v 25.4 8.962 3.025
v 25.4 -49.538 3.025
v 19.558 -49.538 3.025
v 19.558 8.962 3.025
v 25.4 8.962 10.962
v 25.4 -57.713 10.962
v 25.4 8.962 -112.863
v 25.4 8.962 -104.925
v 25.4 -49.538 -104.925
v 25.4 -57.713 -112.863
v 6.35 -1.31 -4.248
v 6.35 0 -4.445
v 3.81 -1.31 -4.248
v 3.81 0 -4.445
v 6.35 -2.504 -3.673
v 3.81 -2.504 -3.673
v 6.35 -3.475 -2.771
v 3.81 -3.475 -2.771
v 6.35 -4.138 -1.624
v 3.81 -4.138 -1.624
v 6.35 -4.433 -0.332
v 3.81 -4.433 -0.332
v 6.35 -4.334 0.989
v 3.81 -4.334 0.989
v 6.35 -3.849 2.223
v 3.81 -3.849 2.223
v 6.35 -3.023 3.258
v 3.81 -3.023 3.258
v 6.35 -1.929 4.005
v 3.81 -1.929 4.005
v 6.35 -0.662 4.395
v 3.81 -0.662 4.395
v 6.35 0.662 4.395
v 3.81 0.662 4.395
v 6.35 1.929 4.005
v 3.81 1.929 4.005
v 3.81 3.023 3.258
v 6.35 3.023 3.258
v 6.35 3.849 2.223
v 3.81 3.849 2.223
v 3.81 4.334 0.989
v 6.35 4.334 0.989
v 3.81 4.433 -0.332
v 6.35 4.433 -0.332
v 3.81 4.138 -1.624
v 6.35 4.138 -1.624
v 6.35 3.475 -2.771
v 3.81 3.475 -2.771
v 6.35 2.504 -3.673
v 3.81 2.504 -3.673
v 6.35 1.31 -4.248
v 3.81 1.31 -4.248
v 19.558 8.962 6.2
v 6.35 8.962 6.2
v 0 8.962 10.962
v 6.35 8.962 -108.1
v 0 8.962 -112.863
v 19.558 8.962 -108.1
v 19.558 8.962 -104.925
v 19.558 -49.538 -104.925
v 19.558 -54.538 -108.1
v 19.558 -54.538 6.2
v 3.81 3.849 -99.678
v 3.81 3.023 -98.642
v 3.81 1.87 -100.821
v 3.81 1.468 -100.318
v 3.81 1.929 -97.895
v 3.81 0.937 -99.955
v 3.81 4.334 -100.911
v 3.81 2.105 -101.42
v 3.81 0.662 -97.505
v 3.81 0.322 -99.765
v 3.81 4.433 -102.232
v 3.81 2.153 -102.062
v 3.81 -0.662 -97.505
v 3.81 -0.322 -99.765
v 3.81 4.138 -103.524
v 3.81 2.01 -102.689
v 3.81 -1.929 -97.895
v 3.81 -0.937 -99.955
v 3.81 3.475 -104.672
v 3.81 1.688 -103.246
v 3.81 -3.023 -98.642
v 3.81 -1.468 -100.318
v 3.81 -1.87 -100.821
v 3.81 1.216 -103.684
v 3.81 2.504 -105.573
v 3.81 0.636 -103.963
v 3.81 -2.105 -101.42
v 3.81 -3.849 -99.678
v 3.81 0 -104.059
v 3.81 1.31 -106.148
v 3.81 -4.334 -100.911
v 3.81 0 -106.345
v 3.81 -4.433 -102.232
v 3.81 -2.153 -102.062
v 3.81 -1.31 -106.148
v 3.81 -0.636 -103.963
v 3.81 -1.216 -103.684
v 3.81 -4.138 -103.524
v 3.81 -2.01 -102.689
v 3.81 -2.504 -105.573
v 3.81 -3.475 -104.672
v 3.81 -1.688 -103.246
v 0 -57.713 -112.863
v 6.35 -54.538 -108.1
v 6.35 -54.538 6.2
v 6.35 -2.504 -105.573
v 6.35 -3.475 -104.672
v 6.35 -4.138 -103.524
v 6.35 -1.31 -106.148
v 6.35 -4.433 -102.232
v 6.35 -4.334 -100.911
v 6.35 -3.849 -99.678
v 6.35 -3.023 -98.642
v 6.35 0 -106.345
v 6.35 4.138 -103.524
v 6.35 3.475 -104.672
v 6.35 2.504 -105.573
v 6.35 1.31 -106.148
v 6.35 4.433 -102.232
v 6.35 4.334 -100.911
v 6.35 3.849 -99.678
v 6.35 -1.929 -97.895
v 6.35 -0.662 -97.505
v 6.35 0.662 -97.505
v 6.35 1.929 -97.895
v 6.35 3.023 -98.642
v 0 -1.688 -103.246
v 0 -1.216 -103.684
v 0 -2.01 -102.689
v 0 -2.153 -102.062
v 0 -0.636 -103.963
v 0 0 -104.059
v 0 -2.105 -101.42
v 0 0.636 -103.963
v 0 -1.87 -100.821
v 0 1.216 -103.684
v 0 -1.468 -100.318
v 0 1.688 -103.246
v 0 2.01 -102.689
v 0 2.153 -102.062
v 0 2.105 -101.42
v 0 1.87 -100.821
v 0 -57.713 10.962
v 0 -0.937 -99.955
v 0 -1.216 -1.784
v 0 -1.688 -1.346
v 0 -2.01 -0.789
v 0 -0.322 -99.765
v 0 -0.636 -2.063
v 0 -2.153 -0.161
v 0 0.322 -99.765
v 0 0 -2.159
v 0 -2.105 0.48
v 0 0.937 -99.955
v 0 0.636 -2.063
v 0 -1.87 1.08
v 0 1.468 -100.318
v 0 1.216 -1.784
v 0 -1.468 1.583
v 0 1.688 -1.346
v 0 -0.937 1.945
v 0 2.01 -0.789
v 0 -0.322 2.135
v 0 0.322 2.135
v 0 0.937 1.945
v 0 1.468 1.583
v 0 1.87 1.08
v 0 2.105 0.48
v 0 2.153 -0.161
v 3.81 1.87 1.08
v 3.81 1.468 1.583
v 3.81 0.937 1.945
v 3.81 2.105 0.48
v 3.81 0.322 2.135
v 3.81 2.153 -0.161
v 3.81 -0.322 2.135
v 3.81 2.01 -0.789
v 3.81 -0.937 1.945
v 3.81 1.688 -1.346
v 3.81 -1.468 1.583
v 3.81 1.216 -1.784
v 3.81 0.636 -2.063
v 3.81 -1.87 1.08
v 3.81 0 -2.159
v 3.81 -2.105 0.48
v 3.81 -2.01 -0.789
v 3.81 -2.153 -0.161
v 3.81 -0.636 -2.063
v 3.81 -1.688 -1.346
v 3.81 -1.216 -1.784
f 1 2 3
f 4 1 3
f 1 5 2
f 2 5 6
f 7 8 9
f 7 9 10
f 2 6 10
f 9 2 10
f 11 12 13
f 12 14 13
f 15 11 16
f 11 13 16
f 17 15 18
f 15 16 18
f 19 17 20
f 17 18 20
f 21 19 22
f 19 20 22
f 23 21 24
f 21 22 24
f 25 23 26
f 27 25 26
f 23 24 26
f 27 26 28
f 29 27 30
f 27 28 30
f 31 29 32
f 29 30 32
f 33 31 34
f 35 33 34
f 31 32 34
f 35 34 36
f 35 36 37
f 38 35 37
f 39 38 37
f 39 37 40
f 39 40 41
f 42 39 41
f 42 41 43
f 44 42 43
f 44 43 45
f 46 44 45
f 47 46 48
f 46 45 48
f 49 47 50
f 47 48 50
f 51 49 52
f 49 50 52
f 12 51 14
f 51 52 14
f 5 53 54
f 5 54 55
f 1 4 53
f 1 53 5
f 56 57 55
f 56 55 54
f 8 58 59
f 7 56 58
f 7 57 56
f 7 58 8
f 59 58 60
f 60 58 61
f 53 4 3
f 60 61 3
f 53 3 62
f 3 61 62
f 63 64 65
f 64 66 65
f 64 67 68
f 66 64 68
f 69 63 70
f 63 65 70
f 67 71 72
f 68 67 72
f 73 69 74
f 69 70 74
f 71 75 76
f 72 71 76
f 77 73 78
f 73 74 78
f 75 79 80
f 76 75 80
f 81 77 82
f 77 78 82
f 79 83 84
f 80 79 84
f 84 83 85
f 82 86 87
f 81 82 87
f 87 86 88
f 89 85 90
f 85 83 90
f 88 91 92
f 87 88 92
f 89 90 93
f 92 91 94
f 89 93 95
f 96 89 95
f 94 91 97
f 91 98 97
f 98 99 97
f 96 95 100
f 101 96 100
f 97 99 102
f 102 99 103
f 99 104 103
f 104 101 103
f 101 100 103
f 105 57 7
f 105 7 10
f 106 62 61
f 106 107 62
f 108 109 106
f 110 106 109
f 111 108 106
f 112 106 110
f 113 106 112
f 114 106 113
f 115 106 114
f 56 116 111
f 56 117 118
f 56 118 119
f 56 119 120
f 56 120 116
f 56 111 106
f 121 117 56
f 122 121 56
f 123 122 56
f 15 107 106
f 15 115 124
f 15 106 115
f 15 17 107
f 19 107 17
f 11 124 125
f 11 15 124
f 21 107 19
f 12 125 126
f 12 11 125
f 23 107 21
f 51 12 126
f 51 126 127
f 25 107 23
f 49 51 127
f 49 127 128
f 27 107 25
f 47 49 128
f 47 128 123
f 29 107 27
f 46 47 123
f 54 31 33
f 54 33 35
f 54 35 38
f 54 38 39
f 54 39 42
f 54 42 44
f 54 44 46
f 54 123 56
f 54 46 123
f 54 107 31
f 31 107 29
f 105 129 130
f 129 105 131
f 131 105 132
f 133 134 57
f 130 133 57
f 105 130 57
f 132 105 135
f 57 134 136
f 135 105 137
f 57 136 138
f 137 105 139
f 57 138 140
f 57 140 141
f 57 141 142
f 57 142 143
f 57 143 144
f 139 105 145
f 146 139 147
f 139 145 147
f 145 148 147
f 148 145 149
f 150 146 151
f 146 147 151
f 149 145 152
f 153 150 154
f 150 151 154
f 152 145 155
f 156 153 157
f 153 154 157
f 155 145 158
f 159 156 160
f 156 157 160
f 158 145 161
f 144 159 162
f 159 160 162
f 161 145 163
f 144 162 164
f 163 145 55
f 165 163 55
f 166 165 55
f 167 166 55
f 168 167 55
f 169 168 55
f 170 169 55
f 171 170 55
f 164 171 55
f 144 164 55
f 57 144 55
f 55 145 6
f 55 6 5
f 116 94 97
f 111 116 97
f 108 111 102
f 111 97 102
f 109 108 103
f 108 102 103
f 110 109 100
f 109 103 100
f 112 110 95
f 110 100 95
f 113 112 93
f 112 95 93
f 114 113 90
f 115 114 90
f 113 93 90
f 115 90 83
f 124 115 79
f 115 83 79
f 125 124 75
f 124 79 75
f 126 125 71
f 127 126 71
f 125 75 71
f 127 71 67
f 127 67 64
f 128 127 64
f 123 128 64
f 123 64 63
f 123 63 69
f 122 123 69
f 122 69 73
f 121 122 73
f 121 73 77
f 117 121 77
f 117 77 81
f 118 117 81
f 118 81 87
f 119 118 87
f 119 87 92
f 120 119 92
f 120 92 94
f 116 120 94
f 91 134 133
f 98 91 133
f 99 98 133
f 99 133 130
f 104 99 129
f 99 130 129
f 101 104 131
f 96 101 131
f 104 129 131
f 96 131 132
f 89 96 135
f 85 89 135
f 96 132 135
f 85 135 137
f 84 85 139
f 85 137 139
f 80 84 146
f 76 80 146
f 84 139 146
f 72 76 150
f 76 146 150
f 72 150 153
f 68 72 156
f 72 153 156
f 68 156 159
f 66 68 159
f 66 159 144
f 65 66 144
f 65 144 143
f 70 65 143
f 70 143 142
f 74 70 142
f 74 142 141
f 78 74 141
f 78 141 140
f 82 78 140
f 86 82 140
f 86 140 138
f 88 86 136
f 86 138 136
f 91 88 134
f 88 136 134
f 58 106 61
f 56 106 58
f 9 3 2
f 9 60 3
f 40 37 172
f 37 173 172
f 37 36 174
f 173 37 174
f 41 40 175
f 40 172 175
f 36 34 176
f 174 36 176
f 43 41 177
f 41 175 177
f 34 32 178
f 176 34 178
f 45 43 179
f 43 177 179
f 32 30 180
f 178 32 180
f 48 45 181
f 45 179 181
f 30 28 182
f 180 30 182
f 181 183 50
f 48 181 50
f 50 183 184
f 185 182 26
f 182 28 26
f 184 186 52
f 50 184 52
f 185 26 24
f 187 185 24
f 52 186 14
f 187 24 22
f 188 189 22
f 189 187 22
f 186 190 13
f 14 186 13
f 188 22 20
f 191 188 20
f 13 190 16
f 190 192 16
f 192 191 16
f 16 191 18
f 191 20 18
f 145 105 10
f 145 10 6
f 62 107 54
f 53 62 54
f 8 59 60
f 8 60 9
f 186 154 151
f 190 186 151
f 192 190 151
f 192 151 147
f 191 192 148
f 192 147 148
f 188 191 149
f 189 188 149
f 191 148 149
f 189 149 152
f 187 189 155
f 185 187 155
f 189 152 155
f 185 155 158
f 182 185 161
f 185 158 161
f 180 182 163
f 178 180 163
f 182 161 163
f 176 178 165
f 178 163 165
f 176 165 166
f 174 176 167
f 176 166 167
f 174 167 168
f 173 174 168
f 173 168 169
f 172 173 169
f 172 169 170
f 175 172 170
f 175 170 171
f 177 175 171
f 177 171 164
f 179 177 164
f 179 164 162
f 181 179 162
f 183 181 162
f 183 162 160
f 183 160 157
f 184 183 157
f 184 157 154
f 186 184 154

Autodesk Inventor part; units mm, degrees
ref_plane "YZ Plane" through (0, 0, 0) normal (1, 0, 0) x (0, 1, 0)
ref_plane "XZ Plane" through (0, 0, 0) normal (0, 1, 0) x (-1, 0, 0)
ref_plane "XY Plane" through (0, 0, 0) normal (0, 0, 1) x (1, 0, 0)
sketch "Sketch1" plane through (0, 0, 0) normal (1, 0, 0) x (0, 1, 0)
  circle A0 centre (0, 0) radius 3.9624 construction
  line L0 (3.9624, 0) -> (8.9624, 0) construction
  line L1 (0, 3.9624) -> (0, 10.9624) construction
  circle A1 centre (0, -101.9002) radius 3.9624 construction
  line L2 (3.9624, -101.9002) -> (8.9624, -101.9002) construction
  line L3 (0, -105.8626) -> (0, -112.8626) construction
  line L4 (8.9624, -112.8626) -> (-57.7126, -112.8626)
  line L5 (-57.7126, -112.8626) -> (-57.7126, 10.9624)
  line L6 (-57.7126, 10.9624) -> (8.9624, 10.9624)
  line L7 (8.9624, 10.9624) -> (8.9624, -112.8626)
  dimension "d0" = 7.9248
  dimension "d1" = 5
  dimension "d13" = 7
  dimension "d15" = 7.9248
  dimension "d16" = 5
  dimension "d17" = 7
extrude "Back plate" add sketch "Sketch1" along normal blind 6.35
sketch "Sketch5" plane through (6.35, 0, 0) normal (1, 0, 0) x (0, 0, -1)
  circle A0 centre (101.9002, 0) radius 3.9624 projected
  circle A1 centre (0, 0) radius 3.9624 projected
hole "Screw holes" at (6.35, 0, 0) at (6.35, 0, -101.9002) direction (-1, 0, 0) diameter 4.318 end through all counterbore diameter 8.89 counterbore depth 2.54
sketch "Sketch3" plane through (6.35, 0, 0) normal (1, 0, 0) x (0, 0, -1)
  line L0 (-10.9624, 8.9624) -> (-6.1999, 8.9624) construction
  line L1 (-10.9624, 8.9624) -> (-10.9624, -57.7126) projected
  line L2 (-6.1999, 8.9624) -> (-10.9624, 8.9624)
  line L3 (-10.9624, 8.9624) -> (-10.9624, -57.7126)
  line L4 (-10.9624, -57.7126) -> (-6.1999, -57.7126)
  line L5 (-6.1999, -57.7126) -> (-6.1999, 8.9624)
  line L6 (112.8626, -57.7126) -> (112.8626, 8.9624) projected
  line L7 (112.8626, 8.9624) -> (108.1001, 8.9624) construction
  line L8 (108.1001, 8.9624) -> (112.8626, 8.9624)
  line L9 (112.8626, 8.9624) -> (112.8626, -57.7126)
  line L10 (112.8626, -57.7126) -> (108.1001, -57.7126)
  line L11 (108.1001, -57.7126) -> (108.1001, 8.9624)
  line L12 (-6.1999, -54.5376) -> (108.1001, -54.5376)
  line L13 (108.1001, -54.5376) -> (108.1001, -57.7126)
  line L14 (108.1001, -57.7126) -> (-6.1999, -57.7126)
  point P0 (0, 0)
  point P1 (112.8626, 8.9624)
  dimension "d21" = 4.7625
  dimension "d22" = 4.7625
  dimension "d23" = 3.175
extrude "Sides and bottom" add sketch "Sketch3" along normal blind 19.05
sketch "Sketch4" plane through (6.35, -54.5376, 6.1999) normal (0, 0, -1) x (-1, 0, 0)
  line L0 (0, 63.5) -> (-19.05, 63.5) construction
  line L1 (0, 0) -> (-19.05, 0) projected
  line L2 (-19.05, 0) -> (-13.208, 0)
  line L3 (-13.208, 0) -> (-13.208, 63.5)
  line L4 (-13.208, 63.5) -> (-19.05, 63.5)
  line L5 (-19.05, 63.5) -> (-19.05, 0)
  point P0 (6.35, 54.5376)
  dimension "d28" = 5.842
extrude "Left lip" add sketch "Sketch4" along normal blind 3.175
sketch "Sketch6" plane through (6.35, -54.5376, -108.1001) normal (0, 0, 1) x (1, 0, 0)
  line L0 (19.05, 63.5) -> (19.05, 0) construction
  line L1 (19.05, 63.5) -> (13.208, 63.5) construction
  line L2 (0, 63.5) -> (19.05, 63.5) construction
  line L3 (19.05, 0) -> (13.208, 0)
  line L4 (13.208, 0) -> (13.208, 63.5)
  line L5 (13.208, 63.5) -> (19.05, 63.5)
  line L6 (19.05, 63.5) -> (19.05, 0)
  point P0 (-6.35, 54.5376)
  dimension "d38" = 5.842
extrude "Right lip" add sketch "Sketch6" along normal blind 3.175
sketch "Sketch7" plane through (6.35, -54.5376, 6.1999) normal (0, 1, 0) x (1, 0, 0)
  line L0 (13.208, 0) -> (13.208, 3.175) projected
  line L1 (13.208, 3.175) -> (19.05, 3.175)
  line L2 (19.05, 3.175) -> (19.05, 111.125)
  line L3 (19.05, 111.125) -> (13.208, 111.125)
  line L4 (13.208, 111.125) -> (13.208, 3.175)
  point P0 (-6.35, 6.1999)
extrude "Bottom lip" add sketch "Sketch7" along normal blind 5
properties part number "License Plate Holder"
